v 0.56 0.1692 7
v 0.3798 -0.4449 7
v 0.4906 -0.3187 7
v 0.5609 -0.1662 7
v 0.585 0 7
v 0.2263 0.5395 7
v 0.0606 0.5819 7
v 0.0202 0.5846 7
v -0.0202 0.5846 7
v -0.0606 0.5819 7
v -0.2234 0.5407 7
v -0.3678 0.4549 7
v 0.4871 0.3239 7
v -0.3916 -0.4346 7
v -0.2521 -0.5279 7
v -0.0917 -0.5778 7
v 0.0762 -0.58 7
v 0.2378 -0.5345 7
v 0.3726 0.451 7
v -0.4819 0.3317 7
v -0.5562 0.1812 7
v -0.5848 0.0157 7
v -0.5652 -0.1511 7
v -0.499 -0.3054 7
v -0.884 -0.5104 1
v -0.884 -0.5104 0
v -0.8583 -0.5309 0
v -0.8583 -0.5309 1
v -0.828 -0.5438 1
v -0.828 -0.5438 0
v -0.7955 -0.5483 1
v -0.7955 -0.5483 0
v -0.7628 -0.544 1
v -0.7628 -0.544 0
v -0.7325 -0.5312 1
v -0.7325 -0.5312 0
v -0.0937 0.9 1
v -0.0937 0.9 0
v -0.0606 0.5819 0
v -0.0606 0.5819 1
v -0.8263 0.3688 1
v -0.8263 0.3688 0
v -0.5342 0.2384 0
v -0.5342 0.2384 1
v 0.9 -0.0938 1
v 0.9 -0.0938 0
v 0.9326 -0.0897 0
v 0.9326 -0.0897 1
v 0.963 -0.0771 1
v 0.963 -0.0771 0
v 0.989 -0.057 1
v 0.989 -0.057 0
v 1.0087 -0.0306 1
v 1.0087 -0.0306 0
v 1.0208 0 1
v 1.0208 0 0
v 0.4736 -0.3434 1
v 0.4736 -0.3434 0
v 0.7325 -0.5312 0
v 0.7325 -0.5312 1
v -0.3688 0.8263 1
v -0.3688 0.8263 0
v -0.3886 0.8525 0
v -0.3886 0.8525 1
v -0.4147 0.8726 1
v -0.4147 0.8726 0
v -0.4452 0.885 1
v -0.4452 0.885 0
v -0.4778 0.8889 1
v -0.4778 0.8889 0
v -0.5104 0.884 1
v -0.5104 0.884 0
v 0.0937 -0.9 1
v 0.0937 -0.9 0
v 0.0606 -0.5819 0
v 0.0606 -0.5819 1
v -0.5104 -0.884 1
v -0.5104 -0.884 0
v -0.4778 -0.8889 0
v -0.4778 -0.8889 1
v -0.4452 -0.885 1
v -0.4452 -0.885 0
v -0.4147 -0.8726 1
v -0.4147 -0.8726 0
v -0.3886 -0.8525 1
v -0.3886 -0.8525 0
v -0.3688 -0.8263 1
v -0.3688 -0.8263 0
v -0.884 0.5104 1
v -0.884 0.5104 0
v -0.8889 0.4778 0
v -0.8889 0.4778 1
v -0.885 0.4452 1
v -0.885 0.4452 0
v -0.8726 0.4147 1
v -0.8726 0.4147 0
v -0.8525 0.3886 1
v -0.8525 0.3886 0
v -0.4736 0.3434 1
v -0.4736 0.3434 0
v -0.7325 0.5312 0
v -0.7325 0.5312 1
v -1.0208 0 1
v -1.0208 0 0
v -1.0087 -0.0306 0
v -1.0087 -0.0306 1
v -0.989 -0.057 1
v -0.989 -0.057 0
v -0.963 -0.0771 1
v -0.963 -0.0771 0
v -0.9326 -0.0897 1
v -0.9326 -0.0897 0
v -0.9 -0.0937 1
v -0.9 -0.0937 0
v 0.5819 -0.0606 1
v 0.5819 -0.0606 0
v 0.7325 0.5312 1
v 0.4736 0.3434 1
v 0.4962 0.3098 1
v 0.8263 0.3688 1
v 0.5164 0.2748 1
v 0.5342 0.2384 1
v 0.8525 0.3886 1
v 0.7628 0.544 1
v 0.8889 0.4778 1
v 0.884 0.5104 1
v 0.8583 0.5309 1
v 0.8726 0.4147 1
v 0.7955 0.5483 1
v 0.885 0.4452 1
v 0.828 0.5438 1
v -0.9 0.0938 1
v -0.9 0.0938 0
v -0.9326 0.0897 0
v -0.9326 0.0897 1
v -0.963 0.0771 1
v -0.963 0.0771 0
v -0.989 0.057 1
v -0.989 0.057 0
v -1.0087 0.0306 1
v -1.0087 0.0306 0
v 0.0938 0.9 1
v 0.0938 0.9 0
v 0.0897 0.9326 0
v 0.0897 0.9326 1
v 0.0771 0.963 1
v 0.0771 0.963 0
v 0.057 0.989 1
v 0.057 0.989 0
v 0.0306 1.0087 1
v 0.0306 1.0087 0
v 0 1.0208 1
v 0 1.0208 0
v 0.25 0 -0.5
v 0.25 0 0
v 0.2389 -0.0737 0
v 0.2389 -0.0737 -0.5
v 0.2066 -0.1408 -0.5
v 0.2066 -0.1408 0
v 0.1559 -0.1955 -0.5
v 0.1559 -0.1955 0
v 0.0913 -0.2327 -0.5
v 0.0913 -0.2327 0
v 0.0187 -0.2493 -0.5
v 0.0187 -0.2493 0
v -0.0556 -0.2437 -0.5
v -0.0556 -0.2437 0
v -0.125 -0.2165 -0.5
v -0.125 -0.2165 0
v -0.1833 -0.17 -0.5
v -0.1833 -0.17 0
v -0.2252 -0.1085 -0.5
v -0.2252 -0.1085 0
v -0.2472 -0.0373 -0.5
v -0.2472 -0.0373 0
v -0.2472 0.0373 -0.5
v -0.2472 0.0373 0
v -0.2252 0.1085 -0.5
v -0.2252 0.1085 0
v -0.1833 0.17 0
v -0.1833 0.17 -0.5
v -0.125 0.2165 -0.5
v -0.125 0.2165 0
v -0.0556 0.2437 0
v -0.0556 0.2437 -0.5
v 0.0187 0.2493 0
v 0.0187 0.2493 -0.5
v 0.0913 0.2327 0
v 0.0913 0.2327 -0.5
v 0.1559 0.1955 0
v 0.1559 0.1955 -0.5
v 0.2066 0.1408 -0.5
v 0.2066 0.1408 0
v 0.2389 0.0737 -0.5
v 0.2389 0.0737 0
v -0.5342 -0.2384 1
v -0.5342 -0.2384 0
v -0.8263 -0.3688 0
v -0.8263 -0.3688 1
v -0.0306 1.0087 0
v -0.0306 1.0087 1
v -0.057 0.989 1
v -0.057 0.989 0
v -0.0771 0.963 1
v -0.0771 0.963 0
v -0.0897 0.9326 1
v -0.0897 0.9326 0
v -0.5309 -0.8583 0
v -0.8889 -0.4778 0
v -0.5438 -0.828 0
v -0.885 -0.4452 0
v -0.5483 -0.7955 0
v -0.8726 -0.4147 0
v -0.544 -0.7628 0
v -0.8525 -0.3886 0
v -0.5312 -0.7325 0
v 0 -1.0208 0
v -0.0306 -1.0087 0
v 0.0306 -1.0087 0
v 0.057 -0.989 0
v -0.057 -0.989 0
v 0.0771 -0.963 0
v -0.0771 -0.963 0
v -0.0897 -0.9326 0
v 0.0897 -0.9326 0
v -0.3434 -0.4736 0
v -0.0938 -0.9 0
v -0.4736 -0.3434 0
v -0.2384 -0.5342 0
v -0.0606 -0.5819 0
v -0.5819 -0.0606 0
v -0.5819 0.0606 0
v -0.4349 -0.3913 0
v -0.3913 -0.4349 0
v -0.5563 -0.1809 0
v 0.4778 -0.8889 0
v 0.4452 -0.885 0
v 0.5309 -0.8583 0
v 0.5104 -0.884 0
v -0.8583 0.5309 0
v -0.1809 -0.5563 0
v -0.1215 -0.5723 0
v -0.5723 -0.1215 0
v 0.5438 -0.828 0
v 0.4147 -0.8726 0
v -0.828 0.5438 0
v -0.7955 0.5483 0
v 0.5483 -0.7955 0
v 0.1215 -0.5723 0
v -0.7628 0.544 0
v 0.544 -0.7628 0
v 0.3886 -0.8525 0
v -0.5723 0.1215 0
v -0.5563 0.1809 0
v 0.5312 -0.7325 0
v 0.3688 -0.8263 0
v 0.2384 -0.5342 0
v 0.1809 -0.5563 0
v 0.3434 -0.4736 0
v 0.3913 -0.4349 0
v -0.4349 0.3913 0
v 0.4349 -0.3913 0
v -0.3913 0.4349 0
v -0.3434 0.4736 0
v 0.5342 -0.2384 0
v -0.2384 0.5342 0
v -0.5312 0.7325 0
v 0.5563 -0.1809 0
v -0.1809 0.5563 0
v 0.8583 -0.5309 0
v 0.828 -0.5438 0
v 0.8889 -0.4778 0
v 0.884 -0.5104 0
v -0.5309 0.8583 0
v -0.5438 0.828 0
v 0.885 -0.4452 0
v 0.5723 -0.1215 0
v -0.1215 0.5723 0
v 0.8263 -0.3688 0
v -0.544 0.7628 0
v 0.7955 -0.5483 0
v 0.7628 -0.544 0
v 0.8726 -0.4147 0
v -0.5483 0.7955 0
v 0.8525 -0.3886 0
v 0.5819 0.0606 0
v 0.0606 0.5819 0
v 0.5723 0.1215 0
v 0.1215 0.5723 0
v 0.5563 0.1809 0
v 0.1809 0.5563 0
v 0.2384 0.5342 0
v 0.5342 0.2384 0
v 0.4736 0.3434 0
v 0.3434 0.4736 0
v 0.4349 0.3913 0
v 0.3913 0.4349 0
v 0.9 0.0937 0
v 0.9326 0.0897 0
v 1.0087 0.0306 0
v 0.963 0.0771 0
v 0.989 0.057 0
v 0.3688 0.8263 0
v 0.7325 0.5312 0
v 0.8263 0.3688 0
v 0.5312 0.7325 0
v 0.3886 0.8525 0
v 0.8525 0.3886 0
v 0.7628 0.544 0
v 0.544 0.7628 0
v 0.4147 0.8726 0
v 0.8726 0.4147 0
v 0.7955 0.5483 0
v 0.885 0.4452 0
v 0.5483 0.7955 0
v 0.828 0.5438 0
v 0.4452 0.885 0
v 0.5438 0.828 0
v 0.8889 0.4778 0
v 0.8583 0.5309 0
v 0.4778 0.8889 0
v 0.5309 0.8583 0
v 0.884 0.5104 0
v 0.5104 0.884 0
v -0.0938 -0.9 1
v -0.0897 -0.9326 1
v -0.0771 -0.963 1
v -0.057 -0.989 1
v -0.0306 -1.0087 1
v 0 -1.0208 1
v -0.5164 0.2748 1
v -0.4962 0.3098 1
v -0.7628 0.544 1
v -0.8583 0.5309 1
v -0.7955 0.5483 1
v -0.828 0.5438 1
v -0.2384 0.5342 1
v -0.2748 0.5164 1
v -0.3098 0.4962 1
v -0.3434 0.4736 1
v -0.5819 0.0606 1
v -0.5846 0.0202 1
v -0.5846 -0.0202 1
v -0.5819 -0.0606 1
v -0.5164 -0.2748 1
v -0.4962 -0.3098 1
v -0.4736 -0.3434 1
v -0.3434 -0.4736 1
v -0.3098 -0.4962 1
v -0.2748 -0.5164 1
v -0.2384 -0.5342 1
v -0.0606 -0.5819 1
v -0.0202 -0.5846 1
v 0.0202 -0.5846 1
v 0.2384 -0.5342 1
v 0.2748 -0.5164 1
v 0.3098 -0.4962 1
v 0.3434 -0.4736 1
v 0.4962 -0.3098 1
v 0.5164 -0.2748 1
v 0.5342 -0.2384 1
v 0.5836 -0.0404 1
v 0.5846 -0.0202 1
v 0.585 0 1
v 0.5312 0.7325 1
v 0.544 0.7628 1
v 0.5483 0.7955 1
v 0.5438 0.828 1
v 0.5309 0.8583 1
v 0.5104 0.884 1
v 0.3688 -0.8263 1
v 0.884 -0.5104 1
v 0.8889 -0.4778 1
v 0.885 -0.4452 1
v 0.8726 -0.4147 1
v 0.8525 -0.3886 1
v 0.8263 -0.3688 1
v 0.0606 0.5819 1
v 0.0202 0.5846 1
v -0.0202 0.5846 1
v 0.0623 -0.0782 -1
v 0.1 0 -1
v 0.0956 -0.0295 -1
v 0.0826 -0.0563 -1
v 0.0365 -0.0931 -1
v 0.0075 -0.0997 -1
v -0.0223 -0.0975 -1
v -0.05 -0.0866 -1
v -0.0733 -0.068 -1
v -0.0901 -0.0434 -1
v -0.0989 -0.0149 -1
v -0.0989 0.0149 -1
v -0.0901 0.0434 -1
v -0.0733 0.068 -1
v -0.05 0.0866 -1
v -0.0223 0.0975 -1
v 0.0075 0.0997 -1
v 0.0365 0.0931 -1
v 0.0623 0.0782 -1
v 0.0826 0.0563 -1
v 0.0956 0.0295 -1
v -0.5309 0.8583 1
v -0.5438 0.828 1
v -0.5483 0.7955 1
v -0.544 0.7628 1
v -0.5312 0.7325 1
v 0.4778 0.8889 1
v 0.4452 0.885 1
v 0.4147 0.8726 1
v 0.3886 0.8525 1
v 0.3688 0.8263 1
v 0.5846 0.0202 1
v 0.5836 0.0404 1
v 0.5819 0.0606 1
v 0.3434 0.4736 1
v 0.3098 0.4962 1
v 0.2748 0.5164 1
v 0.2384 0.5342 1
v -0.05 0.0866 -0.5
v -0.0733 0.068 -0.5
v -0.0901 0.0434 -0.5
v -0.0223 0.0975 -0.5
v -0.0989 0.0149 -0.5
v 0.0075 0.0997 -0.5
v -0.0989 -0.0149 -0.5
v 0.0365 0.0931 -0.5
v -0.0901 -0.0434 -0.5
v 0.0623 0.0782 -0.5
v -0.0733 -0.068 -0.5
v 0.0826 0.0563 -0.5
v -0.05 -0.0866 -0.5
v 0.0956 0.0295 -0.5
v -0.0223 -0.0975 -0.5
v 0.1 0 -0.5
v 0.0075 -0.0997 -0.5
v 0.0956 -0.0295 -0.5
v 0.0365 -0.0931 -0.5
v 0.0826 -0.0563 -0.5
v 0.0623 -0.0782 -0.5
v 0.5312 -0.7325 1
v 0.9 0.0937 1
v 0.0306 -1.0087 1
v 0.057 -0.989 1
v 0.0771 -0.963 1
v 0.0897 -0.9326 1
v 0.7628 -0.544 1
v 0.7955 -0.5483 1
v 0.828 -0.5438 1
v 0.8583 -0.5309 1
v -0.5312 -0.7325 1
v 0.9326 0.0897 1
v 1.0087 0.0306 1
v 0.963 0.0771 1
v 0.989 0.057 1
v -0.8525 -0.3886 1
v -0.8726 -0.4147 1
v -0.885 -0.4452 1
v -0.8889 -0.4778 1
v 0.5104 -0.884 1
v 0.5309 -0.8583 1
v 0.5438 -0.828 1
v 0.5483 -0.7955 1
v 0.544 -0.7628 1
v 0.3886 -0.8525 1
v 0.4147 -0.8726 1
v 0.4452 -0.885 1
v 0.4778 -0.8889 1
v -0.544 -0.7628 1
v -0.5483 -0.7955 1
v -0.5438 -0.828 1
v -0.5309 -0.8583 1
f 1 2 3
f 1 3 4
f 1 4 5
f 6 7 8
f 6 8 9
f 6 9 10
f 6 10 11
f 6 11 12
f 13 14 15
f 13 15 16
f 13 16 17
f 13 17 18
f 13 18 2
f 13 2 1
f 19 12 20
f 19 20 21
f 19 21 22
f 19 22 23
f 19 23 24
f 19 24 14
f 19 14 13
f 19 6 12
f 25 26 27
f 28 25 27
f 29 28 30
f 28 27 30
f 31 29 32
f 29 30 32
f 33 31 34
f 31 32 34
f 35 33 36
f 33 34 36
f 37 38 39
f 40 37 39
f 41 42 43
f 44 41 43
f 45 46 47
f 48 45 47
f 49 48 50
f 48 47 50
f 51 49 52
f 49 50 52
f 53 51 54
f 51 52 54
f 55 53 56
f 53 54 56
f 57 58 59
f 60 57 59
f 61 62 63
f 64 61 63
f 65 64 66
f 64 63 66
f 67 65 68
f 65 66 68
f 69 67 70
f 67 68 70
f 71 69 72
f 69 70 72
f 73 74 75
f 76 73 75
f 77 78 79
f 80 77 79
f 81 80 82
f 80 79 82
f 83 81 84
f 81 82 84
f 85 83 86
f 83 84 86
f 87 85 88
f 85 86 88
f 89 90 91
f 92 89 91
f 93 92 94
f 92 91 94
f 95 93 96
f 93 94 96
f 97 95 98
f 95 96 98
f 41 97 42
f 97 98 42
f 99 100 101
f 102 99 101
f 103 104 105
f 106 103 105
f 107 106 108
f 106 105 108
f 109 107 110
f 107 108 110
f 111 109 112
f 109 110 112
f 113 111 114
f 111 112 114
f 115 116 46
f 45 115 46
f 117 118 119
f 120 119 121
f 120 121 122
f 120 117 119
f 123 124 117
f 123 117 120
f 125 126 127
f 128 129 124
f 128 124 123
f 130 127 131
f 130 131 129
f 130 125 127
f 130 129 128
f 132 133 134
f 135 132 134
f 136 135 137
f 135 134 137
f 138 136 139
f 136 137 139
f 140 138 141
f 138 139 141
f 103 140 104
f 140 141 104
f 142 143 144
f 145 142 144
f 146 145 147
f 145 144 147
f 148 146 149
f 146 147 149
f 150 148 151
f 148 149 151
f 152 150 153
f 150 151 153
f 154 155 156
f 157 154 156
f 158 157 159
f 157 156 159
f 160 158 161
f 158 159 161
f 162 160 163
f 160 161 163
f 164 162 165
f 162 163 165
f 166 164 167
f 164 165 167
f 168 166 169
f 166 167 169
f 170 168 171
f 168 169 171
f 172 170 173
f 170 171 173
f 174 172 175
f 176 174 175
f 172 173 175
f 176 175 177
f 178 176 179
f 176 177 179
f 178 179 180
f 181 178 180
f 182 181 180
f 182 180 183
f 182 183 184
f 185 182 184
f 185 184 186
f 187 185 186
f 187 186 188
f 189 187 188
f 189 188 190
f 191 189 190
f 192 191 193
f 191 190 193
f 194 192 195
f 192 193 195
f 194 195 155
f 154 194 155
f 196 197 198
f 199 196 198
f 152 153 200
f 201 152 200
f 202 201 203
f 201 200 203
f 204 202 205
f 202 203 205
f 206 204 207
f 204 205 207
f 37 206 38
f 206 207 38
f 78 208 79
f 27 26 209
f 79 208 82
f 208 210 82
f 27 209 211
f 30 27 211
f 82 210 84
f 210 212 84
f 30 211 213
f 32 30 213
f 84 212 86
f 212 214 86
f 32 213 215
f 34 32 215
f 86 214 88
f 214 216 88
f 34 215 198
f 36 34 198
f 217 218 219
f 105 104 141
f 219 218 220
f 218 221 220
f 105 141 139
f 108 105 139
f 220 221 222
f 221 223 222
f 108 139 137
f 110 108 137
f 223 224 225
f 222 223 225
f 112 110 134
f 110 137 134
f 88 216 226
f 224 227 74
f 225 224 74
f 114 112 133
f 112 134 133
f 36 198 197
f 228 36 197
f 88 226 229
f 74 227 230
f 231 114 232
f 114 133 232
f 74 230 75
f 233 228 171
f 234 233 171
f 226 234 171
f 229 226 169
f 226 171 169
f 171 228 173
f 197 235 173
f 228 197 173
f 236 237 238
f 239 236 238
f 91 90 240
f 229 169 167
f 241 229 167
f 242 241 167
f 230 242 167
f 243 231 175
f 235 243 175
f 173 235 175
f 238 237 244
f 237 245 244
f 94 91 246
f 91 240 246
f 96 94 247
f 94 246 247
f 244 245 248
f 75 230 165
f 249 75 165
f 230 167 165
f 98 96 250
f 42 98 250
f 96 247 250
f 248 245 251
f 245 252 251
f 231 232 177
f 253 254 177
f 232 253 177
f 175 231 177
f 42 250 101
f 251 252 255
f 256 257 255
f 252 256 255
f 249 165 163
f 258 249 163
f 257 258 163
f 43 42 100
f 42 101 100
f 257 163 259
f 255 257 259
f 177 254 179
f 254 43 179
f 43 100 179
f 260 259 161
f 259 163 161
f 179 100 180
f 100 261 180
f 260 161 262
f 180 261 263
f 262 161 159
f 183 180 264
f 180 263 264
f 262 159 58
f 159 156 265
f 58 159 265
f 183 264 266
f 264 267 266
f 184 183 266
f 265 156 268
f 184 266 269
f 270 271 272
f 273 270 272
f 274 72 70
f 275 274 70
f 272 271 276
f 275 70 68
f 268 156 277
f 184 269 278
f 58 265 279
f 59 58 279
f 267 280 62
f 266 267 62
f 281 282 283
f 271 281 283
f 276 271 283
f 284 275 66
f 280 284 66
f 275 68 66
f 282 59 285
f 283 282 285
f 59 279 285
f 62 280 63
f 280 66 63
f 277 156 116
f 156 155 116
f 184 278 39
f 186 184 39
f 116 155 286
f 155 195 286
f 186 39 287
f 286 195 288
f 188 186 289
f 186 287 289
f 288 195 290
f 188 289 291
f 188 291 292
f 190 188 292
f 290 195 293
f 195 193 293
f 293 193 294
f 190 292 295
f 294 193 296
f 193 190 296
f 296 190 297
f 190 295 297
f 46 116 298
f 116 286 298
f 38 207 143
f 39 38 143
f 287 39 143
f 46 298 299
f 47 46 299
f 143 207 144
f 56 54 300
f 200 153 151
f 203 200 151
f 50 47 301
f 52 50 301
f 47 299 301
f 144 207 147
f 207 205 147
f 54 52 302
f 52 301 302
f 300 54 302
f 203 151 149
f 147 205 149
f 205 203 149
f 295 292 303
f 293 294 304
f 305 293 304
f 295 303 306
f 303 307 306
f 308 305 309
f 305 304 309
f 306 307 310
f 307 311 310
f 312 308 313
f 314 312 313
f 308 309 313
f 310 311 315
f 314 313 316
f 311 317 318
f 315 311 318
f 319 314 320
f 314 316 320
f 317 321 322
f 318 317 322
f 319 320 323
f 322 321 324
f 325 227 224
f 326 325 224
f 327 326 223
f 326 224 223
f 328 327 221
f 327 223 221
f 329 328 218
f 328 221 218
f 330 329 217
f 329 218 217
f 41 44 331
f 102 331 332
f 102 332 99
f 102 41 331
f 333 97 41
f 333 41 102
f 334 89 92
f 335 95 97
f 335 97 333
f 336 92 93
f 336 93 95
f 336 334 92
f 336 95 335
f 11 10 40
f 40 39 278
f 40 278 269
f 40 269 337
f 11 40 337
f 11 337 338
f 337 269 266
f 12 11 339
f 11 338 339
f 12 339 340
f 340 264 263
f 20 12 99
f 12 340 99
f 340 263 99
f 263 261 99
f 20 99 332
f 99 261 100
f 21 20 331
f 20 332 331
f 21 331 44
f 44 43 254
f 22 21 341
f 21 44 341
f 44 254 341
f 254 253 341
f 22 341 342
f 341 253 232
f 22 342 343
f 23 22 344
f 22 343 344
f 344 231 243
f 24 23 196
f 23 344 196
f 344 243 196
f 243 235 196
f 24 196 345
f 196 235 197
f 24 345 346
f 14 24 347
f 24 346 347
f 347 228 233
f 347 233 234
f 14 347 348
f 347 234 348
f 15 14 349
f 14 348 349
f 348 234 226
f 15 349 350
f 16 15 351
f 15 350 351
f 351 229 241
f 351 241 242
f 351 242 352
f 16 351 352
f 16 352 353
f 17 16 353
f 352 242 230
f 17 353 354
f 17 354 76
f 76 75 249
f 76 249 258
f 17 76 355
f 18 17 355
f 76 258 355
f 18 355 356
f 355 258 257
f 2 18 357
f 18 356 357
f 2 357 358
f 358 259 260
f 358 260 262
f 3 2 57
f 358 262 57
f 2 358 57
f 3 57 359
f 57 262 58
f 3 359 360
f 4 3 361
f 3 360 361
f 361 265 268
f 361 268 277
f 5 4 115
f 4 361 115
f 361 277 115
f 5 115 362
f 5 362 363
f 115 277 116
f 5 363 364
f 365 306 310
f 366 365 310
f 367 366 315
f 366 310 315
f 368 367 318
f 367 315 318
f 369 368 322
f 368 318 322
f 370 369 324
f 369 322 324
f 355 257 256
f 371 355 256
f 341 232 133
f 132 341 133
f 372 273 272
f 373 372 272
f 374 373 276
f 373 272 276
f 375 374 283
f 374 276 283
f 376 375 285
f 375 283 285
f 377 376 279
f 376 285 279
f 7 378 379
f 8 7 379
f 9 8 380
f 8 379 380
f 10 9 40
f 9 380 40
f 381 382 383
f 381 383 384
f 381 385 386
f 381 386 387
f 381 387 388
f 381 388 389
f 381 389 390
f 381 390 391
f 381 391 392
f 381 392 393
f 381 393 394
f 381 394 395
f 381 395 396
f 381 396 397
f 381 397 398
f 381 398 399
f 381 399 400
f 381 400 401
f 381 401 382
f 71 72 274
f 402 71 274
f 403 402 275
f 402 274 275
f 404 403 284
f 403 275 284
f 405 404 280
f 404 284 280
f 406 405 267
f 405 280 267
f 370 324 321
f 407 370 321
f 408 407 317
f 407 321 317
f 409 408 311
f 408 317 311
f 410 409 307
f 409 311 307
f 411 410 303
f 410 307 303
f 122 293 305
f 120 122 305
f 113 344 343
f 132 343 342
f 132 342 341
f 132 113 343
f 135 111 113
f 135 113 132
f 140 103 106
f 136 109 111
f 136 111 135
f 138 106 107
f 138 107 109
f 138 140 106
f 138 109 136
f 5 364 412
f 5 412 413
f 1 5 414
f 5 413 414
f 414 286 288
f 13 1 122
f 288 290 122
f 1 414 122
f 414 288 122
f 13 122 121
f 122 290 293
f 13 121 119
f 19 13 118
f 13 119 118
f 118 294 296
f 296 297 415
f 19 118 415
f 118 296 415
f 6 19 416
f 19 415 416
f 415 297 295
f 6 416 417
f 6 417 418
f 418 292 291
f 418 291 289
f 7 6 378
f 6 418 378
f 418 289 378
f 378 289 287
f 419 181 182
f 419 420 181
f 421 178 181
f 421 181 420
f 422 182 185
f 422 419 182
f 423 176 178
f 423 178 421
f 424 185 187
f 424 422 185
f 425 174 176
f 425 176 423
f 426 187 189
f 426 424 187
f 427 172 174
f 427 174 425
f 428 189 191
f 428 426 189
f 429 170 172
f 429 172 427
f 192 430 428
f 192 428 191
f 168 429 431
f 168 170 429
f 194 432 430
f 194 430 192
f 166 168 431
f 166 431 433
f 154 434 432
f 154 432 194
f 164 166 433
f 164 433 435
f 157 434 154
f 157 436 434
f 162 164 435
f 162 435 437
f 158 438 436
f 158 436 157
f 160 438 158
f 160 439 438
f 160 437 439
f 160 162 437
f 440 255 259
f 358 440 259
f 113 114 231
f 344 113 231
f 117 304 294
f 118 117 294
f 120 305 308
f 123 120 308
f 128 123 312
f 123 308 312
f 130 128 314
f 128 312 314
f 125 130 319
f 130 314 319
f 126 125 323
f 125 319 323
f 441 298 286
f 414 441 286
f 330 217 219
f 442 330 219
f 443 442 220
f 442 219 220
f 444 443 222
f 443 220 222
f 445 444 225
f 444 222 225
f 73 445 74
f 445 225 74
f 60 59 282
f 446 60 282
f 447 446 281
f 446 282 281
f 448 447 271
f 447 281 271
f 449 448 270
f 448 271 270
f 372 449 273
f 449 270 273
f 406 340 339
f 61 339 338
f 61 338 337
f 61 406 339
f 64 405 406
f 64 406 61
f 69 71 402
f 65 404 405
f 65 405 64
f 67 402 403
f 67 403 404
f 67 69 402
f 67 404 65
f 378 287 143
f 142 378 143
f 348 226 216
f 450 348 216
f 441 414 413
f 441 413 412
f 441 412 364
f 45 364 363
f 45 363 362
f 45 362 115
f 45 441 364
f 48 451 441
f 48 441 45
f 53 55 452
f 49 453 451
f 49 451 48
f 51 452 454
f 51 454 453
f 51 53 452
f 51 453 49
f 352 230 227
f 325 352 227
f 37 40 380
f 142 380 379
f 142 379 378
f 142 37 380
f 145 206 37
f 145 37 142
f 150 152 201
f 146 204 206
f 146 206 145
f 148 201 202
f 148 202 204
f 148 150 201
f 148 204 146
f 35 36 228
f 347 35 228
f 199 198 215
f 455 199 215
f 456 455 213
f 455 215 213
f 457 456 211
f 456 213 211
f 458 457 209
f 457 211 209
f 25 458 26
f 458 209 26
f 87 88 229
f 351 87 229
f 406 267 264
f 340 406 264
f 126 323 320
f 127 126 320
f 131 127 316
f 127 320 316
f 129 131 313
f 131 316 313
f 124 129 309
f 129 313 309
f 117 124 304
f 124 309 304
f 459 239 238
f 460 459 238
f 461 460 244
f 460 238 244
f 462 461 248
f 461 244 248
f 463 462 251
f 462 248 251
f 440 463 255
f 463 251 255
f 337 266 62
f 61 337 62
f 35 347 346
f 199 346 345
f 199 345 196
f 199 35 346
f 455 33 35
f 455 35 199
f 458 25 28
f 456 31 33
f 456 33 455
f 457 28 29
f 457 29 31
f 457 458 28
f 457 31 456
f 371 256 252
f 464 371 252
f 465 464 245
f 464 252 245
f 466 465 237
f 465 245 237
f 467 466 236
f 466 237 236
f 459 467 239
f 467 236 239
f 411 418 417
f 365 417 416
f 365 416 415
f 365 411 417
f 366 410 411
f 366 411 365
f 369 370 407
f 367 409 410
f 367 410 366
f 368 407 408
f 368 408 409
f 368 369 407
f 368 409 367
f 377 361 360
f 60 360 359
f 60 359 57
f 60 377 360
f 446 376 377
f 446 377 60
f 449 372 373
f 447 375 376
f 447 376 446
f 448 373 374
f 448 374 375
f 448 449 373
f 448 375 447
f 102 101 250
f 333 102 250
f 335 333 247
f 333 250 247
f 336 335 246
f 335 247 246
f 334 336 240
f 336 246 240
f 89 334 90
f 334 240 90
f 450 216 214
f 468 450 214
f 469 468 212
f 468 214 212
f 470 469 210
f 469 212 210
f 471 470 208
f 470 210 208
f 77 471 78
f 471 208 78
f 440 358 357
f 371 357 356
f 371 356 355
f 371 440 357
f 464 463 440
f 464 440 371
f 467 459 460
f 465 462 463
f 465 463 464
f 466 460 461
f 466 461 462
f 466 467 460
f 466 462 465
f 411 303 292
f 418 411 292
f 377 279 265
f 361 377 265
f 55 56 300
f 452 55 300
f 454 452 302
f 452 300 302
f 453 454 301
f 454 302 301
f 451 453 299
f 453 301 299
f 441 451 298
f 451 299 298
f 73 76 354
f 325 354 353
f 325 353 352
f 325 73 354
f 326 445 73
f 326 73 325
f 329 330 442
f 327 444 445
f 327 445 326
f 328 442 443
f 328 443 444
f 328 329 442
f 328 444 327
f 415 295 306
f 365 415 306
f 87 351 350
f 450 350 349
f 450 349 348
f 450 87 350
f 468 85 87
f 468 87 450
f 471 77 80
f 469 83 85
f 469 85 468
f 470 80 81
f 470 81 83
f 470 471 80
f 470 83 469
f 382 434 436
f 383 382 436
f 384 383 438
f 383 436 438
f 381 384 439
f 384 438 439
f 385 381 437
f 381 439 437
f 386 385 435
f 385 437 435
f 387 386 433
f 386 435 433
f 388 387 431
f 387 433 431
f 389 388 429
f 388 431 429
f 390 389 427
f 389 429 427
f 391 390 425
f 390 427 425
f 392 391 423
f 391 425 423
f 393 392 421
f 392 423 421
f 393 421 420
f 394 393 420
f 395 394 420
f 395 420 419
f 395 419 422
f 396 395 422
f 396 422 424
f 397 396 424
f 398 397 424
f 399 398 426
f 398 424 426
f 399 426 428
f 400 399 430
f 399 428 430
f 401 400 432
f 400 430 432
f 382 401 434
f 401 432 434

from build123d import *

# Parameters (mm, degrees)
F1_DEPTH        = 1
F1_COPIES_COUNT = 12
F3_DEPTH        = 7
F5_R            = 0.25
F6_DEPTH        = 0.5
F7_R            = 0.1
F8_DEPTH        = 0.5


# Not quite as in the source:
# - a feature of the source that left no trace in its solid (it failed there, or was rolled back) is left out
# - a pattern or mirror of a feature is missing from the dataset's text; its kind, count and spacing are read off the source's solid


with BuildPart() as f1:
    # F0 (on Top) → F1 (new body)
    with BuildSketch(Plane.XY):
        with BuildLine():
            ThreePointArc((0, 1.02075), (-0.0679119016, 0.9767079981), (-0.09375, 0.9))
            Line((-0.09375, 0.9), (-0.0606095593, 0.5818517692))
            ThreePointArc((-0.0606095593, 0.5818517692), (0, 0.585), (0.0606095593, 0.5818517692))
            Line((0.0606095593, 0.5818517692), (0.09375, 0.9))
            ThreePointArc((0.09375, 0.9), (0.0679119016, 0.9767079981), (0, 1.02075))
        make_face()
    extrude(amount=F1_DEPTH)


with BuildPart() as f1_copies_1:
    # F1_copies: instance of F1
    add(f1.part.rotate(Axis((0, 0, 0), (0, 0, 1)), 1 * 360 / F1_COPIES_COUNT))


with BuildPart() as f1_copies_2:
    # F1_copies: instance of F1
    add(f1.part.rotate(Axis((0, 0, 0), (0, 0, 1)), 2 * 360 / F1_COPIES_COUNT))


with BuildPart() as f1_copies_3:
    # F1_copies: instance of F1
    add(f1.part.rotate(Axis((0, 0, 0), (0, 0, 1)), 3 * 360 / F1_COPIES_COUNT))


with BuildPart() as f1_copies_4:
    # F1_copies: instance of F1
    add(f1.part.rotate(Axis((0, 0, 0), (0, 0, 1)), 4 * 360 / F1_COPIES_COUNT))


with BuildPart() as f1_copies_5:
    # F1_copies: instance of F1
    add(f1.part.rotate(Axis((0, 0, 0), (0, 0, 1)), 5 * 360 / F1_COPIES_COUNT))


with BuildPart() as f1_copies_6:
    # F1_copies: instance of F1
    add(f1.part.rotate(Axis((0, 0, 0), (0, 0, 1)), 6 * 360 / F1_COPIES_COUNT))


with BuildPart() as f1_copies_7:
    # F1_copies: instance of F1
    add(f1.part.rotate(Axis((0, 0, 0), (0, 0, 1)), 7 * 360 / F1_COPIES_COUNT))


with BuildPart() as f1_copies_8:
    # F1_copies: instance of F1
    add(f1.part.rotate(Axis((0, 0, 0), (0, 0, 1)), 8 * 360 / F1_COPIES_COUNT))


with BuildPart() as f1_copies_9:
    # F1_copies: instance of F1
    add(f1.part.rotate(Axis((0, 0, 0), (0, 0, 1)), 9 * 360 / F1_COPIES_COUNT))


with BuildPart() as f1_copies_10:
    # F1_copies: instance of F1
    add(f1.part.rotate(Axis((0, 0, 0), (0, 0, 1)), 10 * 360 / F1_COPIES_COUNT))


with BuildPart() as f1_copies_11:
    # F1_copies: instance of F1
    add(f1.part.rotate(Axis((0, 0, 0), (0, 0, 1)), 11 * 360 / F1_COPIES_COUNT))


with BuildPart() as f1_1:
    add(f1.part)

    add(f1_copies_1.part)  # F3 merges F1_copies_1

    add(f1_copies_2.part)  # F3 merges F1_copies_2

    add(f1_copies_3.part)  # F3 merges F1_copies_3

    add(f1_copies_4.part)  # F3 merges F1_copies_4

    add(f1_copies_5.part)  # F3 merges F1_copies_5

    add(f1_copies_6.part)  # F3 merges F1_copies_6

    add(f1_copies_7.part)  # F3 merges F1_copies_7

    add(f1_copies_8.part)  # F3 merges F1_copies_8

    add(f1_copies_9.part)  # F3 merges F1_copies_9

    add(f1_copies_10.part)  # F3 merges F1_copies_10

    add(f1_copies_11.part)  # F3 merges F1_copies_11
    # F0 (on Top) → F3 (join)
    with BuildSketch(Plane.XY):
        with BuildLine():
            ThreePointArc((0.0606095593, 0.5818517692), (0, 0.585), (-0.0606095593, 0.5818517692))
            ThreePointArc((-0.0606095593, 0.5818517692), (-0.3916429546, -0.4345581619), (0.585, 0))
            ThreePointArc((0.585, 0), (0.4345581619, 0.3916429546), (0.0606095593, 0.5818517692))
        make_face()
    extrude(amount=F3_DEPTH)

    # F4: union 

    # F5 (on face) → F6 (join)
    with BuildSketch(Plane(origin=(0, 0, 0), x_dir=(1, 0, 0), z_dir=(0, 0, -1))):
        Circle(F5_R)
    extrude(amount=F6_DEPTH)

    # F7 (on face) → F8 (join)
    with BuildSketch(Plane(origin=(0, 0, -0.5), x_dir=(1, 0, 0), z_dir=(0, 0, -1))):
        Circle(F7_R)
    extrude(amount=F8_DEPTH)


solid = f1_1.part
